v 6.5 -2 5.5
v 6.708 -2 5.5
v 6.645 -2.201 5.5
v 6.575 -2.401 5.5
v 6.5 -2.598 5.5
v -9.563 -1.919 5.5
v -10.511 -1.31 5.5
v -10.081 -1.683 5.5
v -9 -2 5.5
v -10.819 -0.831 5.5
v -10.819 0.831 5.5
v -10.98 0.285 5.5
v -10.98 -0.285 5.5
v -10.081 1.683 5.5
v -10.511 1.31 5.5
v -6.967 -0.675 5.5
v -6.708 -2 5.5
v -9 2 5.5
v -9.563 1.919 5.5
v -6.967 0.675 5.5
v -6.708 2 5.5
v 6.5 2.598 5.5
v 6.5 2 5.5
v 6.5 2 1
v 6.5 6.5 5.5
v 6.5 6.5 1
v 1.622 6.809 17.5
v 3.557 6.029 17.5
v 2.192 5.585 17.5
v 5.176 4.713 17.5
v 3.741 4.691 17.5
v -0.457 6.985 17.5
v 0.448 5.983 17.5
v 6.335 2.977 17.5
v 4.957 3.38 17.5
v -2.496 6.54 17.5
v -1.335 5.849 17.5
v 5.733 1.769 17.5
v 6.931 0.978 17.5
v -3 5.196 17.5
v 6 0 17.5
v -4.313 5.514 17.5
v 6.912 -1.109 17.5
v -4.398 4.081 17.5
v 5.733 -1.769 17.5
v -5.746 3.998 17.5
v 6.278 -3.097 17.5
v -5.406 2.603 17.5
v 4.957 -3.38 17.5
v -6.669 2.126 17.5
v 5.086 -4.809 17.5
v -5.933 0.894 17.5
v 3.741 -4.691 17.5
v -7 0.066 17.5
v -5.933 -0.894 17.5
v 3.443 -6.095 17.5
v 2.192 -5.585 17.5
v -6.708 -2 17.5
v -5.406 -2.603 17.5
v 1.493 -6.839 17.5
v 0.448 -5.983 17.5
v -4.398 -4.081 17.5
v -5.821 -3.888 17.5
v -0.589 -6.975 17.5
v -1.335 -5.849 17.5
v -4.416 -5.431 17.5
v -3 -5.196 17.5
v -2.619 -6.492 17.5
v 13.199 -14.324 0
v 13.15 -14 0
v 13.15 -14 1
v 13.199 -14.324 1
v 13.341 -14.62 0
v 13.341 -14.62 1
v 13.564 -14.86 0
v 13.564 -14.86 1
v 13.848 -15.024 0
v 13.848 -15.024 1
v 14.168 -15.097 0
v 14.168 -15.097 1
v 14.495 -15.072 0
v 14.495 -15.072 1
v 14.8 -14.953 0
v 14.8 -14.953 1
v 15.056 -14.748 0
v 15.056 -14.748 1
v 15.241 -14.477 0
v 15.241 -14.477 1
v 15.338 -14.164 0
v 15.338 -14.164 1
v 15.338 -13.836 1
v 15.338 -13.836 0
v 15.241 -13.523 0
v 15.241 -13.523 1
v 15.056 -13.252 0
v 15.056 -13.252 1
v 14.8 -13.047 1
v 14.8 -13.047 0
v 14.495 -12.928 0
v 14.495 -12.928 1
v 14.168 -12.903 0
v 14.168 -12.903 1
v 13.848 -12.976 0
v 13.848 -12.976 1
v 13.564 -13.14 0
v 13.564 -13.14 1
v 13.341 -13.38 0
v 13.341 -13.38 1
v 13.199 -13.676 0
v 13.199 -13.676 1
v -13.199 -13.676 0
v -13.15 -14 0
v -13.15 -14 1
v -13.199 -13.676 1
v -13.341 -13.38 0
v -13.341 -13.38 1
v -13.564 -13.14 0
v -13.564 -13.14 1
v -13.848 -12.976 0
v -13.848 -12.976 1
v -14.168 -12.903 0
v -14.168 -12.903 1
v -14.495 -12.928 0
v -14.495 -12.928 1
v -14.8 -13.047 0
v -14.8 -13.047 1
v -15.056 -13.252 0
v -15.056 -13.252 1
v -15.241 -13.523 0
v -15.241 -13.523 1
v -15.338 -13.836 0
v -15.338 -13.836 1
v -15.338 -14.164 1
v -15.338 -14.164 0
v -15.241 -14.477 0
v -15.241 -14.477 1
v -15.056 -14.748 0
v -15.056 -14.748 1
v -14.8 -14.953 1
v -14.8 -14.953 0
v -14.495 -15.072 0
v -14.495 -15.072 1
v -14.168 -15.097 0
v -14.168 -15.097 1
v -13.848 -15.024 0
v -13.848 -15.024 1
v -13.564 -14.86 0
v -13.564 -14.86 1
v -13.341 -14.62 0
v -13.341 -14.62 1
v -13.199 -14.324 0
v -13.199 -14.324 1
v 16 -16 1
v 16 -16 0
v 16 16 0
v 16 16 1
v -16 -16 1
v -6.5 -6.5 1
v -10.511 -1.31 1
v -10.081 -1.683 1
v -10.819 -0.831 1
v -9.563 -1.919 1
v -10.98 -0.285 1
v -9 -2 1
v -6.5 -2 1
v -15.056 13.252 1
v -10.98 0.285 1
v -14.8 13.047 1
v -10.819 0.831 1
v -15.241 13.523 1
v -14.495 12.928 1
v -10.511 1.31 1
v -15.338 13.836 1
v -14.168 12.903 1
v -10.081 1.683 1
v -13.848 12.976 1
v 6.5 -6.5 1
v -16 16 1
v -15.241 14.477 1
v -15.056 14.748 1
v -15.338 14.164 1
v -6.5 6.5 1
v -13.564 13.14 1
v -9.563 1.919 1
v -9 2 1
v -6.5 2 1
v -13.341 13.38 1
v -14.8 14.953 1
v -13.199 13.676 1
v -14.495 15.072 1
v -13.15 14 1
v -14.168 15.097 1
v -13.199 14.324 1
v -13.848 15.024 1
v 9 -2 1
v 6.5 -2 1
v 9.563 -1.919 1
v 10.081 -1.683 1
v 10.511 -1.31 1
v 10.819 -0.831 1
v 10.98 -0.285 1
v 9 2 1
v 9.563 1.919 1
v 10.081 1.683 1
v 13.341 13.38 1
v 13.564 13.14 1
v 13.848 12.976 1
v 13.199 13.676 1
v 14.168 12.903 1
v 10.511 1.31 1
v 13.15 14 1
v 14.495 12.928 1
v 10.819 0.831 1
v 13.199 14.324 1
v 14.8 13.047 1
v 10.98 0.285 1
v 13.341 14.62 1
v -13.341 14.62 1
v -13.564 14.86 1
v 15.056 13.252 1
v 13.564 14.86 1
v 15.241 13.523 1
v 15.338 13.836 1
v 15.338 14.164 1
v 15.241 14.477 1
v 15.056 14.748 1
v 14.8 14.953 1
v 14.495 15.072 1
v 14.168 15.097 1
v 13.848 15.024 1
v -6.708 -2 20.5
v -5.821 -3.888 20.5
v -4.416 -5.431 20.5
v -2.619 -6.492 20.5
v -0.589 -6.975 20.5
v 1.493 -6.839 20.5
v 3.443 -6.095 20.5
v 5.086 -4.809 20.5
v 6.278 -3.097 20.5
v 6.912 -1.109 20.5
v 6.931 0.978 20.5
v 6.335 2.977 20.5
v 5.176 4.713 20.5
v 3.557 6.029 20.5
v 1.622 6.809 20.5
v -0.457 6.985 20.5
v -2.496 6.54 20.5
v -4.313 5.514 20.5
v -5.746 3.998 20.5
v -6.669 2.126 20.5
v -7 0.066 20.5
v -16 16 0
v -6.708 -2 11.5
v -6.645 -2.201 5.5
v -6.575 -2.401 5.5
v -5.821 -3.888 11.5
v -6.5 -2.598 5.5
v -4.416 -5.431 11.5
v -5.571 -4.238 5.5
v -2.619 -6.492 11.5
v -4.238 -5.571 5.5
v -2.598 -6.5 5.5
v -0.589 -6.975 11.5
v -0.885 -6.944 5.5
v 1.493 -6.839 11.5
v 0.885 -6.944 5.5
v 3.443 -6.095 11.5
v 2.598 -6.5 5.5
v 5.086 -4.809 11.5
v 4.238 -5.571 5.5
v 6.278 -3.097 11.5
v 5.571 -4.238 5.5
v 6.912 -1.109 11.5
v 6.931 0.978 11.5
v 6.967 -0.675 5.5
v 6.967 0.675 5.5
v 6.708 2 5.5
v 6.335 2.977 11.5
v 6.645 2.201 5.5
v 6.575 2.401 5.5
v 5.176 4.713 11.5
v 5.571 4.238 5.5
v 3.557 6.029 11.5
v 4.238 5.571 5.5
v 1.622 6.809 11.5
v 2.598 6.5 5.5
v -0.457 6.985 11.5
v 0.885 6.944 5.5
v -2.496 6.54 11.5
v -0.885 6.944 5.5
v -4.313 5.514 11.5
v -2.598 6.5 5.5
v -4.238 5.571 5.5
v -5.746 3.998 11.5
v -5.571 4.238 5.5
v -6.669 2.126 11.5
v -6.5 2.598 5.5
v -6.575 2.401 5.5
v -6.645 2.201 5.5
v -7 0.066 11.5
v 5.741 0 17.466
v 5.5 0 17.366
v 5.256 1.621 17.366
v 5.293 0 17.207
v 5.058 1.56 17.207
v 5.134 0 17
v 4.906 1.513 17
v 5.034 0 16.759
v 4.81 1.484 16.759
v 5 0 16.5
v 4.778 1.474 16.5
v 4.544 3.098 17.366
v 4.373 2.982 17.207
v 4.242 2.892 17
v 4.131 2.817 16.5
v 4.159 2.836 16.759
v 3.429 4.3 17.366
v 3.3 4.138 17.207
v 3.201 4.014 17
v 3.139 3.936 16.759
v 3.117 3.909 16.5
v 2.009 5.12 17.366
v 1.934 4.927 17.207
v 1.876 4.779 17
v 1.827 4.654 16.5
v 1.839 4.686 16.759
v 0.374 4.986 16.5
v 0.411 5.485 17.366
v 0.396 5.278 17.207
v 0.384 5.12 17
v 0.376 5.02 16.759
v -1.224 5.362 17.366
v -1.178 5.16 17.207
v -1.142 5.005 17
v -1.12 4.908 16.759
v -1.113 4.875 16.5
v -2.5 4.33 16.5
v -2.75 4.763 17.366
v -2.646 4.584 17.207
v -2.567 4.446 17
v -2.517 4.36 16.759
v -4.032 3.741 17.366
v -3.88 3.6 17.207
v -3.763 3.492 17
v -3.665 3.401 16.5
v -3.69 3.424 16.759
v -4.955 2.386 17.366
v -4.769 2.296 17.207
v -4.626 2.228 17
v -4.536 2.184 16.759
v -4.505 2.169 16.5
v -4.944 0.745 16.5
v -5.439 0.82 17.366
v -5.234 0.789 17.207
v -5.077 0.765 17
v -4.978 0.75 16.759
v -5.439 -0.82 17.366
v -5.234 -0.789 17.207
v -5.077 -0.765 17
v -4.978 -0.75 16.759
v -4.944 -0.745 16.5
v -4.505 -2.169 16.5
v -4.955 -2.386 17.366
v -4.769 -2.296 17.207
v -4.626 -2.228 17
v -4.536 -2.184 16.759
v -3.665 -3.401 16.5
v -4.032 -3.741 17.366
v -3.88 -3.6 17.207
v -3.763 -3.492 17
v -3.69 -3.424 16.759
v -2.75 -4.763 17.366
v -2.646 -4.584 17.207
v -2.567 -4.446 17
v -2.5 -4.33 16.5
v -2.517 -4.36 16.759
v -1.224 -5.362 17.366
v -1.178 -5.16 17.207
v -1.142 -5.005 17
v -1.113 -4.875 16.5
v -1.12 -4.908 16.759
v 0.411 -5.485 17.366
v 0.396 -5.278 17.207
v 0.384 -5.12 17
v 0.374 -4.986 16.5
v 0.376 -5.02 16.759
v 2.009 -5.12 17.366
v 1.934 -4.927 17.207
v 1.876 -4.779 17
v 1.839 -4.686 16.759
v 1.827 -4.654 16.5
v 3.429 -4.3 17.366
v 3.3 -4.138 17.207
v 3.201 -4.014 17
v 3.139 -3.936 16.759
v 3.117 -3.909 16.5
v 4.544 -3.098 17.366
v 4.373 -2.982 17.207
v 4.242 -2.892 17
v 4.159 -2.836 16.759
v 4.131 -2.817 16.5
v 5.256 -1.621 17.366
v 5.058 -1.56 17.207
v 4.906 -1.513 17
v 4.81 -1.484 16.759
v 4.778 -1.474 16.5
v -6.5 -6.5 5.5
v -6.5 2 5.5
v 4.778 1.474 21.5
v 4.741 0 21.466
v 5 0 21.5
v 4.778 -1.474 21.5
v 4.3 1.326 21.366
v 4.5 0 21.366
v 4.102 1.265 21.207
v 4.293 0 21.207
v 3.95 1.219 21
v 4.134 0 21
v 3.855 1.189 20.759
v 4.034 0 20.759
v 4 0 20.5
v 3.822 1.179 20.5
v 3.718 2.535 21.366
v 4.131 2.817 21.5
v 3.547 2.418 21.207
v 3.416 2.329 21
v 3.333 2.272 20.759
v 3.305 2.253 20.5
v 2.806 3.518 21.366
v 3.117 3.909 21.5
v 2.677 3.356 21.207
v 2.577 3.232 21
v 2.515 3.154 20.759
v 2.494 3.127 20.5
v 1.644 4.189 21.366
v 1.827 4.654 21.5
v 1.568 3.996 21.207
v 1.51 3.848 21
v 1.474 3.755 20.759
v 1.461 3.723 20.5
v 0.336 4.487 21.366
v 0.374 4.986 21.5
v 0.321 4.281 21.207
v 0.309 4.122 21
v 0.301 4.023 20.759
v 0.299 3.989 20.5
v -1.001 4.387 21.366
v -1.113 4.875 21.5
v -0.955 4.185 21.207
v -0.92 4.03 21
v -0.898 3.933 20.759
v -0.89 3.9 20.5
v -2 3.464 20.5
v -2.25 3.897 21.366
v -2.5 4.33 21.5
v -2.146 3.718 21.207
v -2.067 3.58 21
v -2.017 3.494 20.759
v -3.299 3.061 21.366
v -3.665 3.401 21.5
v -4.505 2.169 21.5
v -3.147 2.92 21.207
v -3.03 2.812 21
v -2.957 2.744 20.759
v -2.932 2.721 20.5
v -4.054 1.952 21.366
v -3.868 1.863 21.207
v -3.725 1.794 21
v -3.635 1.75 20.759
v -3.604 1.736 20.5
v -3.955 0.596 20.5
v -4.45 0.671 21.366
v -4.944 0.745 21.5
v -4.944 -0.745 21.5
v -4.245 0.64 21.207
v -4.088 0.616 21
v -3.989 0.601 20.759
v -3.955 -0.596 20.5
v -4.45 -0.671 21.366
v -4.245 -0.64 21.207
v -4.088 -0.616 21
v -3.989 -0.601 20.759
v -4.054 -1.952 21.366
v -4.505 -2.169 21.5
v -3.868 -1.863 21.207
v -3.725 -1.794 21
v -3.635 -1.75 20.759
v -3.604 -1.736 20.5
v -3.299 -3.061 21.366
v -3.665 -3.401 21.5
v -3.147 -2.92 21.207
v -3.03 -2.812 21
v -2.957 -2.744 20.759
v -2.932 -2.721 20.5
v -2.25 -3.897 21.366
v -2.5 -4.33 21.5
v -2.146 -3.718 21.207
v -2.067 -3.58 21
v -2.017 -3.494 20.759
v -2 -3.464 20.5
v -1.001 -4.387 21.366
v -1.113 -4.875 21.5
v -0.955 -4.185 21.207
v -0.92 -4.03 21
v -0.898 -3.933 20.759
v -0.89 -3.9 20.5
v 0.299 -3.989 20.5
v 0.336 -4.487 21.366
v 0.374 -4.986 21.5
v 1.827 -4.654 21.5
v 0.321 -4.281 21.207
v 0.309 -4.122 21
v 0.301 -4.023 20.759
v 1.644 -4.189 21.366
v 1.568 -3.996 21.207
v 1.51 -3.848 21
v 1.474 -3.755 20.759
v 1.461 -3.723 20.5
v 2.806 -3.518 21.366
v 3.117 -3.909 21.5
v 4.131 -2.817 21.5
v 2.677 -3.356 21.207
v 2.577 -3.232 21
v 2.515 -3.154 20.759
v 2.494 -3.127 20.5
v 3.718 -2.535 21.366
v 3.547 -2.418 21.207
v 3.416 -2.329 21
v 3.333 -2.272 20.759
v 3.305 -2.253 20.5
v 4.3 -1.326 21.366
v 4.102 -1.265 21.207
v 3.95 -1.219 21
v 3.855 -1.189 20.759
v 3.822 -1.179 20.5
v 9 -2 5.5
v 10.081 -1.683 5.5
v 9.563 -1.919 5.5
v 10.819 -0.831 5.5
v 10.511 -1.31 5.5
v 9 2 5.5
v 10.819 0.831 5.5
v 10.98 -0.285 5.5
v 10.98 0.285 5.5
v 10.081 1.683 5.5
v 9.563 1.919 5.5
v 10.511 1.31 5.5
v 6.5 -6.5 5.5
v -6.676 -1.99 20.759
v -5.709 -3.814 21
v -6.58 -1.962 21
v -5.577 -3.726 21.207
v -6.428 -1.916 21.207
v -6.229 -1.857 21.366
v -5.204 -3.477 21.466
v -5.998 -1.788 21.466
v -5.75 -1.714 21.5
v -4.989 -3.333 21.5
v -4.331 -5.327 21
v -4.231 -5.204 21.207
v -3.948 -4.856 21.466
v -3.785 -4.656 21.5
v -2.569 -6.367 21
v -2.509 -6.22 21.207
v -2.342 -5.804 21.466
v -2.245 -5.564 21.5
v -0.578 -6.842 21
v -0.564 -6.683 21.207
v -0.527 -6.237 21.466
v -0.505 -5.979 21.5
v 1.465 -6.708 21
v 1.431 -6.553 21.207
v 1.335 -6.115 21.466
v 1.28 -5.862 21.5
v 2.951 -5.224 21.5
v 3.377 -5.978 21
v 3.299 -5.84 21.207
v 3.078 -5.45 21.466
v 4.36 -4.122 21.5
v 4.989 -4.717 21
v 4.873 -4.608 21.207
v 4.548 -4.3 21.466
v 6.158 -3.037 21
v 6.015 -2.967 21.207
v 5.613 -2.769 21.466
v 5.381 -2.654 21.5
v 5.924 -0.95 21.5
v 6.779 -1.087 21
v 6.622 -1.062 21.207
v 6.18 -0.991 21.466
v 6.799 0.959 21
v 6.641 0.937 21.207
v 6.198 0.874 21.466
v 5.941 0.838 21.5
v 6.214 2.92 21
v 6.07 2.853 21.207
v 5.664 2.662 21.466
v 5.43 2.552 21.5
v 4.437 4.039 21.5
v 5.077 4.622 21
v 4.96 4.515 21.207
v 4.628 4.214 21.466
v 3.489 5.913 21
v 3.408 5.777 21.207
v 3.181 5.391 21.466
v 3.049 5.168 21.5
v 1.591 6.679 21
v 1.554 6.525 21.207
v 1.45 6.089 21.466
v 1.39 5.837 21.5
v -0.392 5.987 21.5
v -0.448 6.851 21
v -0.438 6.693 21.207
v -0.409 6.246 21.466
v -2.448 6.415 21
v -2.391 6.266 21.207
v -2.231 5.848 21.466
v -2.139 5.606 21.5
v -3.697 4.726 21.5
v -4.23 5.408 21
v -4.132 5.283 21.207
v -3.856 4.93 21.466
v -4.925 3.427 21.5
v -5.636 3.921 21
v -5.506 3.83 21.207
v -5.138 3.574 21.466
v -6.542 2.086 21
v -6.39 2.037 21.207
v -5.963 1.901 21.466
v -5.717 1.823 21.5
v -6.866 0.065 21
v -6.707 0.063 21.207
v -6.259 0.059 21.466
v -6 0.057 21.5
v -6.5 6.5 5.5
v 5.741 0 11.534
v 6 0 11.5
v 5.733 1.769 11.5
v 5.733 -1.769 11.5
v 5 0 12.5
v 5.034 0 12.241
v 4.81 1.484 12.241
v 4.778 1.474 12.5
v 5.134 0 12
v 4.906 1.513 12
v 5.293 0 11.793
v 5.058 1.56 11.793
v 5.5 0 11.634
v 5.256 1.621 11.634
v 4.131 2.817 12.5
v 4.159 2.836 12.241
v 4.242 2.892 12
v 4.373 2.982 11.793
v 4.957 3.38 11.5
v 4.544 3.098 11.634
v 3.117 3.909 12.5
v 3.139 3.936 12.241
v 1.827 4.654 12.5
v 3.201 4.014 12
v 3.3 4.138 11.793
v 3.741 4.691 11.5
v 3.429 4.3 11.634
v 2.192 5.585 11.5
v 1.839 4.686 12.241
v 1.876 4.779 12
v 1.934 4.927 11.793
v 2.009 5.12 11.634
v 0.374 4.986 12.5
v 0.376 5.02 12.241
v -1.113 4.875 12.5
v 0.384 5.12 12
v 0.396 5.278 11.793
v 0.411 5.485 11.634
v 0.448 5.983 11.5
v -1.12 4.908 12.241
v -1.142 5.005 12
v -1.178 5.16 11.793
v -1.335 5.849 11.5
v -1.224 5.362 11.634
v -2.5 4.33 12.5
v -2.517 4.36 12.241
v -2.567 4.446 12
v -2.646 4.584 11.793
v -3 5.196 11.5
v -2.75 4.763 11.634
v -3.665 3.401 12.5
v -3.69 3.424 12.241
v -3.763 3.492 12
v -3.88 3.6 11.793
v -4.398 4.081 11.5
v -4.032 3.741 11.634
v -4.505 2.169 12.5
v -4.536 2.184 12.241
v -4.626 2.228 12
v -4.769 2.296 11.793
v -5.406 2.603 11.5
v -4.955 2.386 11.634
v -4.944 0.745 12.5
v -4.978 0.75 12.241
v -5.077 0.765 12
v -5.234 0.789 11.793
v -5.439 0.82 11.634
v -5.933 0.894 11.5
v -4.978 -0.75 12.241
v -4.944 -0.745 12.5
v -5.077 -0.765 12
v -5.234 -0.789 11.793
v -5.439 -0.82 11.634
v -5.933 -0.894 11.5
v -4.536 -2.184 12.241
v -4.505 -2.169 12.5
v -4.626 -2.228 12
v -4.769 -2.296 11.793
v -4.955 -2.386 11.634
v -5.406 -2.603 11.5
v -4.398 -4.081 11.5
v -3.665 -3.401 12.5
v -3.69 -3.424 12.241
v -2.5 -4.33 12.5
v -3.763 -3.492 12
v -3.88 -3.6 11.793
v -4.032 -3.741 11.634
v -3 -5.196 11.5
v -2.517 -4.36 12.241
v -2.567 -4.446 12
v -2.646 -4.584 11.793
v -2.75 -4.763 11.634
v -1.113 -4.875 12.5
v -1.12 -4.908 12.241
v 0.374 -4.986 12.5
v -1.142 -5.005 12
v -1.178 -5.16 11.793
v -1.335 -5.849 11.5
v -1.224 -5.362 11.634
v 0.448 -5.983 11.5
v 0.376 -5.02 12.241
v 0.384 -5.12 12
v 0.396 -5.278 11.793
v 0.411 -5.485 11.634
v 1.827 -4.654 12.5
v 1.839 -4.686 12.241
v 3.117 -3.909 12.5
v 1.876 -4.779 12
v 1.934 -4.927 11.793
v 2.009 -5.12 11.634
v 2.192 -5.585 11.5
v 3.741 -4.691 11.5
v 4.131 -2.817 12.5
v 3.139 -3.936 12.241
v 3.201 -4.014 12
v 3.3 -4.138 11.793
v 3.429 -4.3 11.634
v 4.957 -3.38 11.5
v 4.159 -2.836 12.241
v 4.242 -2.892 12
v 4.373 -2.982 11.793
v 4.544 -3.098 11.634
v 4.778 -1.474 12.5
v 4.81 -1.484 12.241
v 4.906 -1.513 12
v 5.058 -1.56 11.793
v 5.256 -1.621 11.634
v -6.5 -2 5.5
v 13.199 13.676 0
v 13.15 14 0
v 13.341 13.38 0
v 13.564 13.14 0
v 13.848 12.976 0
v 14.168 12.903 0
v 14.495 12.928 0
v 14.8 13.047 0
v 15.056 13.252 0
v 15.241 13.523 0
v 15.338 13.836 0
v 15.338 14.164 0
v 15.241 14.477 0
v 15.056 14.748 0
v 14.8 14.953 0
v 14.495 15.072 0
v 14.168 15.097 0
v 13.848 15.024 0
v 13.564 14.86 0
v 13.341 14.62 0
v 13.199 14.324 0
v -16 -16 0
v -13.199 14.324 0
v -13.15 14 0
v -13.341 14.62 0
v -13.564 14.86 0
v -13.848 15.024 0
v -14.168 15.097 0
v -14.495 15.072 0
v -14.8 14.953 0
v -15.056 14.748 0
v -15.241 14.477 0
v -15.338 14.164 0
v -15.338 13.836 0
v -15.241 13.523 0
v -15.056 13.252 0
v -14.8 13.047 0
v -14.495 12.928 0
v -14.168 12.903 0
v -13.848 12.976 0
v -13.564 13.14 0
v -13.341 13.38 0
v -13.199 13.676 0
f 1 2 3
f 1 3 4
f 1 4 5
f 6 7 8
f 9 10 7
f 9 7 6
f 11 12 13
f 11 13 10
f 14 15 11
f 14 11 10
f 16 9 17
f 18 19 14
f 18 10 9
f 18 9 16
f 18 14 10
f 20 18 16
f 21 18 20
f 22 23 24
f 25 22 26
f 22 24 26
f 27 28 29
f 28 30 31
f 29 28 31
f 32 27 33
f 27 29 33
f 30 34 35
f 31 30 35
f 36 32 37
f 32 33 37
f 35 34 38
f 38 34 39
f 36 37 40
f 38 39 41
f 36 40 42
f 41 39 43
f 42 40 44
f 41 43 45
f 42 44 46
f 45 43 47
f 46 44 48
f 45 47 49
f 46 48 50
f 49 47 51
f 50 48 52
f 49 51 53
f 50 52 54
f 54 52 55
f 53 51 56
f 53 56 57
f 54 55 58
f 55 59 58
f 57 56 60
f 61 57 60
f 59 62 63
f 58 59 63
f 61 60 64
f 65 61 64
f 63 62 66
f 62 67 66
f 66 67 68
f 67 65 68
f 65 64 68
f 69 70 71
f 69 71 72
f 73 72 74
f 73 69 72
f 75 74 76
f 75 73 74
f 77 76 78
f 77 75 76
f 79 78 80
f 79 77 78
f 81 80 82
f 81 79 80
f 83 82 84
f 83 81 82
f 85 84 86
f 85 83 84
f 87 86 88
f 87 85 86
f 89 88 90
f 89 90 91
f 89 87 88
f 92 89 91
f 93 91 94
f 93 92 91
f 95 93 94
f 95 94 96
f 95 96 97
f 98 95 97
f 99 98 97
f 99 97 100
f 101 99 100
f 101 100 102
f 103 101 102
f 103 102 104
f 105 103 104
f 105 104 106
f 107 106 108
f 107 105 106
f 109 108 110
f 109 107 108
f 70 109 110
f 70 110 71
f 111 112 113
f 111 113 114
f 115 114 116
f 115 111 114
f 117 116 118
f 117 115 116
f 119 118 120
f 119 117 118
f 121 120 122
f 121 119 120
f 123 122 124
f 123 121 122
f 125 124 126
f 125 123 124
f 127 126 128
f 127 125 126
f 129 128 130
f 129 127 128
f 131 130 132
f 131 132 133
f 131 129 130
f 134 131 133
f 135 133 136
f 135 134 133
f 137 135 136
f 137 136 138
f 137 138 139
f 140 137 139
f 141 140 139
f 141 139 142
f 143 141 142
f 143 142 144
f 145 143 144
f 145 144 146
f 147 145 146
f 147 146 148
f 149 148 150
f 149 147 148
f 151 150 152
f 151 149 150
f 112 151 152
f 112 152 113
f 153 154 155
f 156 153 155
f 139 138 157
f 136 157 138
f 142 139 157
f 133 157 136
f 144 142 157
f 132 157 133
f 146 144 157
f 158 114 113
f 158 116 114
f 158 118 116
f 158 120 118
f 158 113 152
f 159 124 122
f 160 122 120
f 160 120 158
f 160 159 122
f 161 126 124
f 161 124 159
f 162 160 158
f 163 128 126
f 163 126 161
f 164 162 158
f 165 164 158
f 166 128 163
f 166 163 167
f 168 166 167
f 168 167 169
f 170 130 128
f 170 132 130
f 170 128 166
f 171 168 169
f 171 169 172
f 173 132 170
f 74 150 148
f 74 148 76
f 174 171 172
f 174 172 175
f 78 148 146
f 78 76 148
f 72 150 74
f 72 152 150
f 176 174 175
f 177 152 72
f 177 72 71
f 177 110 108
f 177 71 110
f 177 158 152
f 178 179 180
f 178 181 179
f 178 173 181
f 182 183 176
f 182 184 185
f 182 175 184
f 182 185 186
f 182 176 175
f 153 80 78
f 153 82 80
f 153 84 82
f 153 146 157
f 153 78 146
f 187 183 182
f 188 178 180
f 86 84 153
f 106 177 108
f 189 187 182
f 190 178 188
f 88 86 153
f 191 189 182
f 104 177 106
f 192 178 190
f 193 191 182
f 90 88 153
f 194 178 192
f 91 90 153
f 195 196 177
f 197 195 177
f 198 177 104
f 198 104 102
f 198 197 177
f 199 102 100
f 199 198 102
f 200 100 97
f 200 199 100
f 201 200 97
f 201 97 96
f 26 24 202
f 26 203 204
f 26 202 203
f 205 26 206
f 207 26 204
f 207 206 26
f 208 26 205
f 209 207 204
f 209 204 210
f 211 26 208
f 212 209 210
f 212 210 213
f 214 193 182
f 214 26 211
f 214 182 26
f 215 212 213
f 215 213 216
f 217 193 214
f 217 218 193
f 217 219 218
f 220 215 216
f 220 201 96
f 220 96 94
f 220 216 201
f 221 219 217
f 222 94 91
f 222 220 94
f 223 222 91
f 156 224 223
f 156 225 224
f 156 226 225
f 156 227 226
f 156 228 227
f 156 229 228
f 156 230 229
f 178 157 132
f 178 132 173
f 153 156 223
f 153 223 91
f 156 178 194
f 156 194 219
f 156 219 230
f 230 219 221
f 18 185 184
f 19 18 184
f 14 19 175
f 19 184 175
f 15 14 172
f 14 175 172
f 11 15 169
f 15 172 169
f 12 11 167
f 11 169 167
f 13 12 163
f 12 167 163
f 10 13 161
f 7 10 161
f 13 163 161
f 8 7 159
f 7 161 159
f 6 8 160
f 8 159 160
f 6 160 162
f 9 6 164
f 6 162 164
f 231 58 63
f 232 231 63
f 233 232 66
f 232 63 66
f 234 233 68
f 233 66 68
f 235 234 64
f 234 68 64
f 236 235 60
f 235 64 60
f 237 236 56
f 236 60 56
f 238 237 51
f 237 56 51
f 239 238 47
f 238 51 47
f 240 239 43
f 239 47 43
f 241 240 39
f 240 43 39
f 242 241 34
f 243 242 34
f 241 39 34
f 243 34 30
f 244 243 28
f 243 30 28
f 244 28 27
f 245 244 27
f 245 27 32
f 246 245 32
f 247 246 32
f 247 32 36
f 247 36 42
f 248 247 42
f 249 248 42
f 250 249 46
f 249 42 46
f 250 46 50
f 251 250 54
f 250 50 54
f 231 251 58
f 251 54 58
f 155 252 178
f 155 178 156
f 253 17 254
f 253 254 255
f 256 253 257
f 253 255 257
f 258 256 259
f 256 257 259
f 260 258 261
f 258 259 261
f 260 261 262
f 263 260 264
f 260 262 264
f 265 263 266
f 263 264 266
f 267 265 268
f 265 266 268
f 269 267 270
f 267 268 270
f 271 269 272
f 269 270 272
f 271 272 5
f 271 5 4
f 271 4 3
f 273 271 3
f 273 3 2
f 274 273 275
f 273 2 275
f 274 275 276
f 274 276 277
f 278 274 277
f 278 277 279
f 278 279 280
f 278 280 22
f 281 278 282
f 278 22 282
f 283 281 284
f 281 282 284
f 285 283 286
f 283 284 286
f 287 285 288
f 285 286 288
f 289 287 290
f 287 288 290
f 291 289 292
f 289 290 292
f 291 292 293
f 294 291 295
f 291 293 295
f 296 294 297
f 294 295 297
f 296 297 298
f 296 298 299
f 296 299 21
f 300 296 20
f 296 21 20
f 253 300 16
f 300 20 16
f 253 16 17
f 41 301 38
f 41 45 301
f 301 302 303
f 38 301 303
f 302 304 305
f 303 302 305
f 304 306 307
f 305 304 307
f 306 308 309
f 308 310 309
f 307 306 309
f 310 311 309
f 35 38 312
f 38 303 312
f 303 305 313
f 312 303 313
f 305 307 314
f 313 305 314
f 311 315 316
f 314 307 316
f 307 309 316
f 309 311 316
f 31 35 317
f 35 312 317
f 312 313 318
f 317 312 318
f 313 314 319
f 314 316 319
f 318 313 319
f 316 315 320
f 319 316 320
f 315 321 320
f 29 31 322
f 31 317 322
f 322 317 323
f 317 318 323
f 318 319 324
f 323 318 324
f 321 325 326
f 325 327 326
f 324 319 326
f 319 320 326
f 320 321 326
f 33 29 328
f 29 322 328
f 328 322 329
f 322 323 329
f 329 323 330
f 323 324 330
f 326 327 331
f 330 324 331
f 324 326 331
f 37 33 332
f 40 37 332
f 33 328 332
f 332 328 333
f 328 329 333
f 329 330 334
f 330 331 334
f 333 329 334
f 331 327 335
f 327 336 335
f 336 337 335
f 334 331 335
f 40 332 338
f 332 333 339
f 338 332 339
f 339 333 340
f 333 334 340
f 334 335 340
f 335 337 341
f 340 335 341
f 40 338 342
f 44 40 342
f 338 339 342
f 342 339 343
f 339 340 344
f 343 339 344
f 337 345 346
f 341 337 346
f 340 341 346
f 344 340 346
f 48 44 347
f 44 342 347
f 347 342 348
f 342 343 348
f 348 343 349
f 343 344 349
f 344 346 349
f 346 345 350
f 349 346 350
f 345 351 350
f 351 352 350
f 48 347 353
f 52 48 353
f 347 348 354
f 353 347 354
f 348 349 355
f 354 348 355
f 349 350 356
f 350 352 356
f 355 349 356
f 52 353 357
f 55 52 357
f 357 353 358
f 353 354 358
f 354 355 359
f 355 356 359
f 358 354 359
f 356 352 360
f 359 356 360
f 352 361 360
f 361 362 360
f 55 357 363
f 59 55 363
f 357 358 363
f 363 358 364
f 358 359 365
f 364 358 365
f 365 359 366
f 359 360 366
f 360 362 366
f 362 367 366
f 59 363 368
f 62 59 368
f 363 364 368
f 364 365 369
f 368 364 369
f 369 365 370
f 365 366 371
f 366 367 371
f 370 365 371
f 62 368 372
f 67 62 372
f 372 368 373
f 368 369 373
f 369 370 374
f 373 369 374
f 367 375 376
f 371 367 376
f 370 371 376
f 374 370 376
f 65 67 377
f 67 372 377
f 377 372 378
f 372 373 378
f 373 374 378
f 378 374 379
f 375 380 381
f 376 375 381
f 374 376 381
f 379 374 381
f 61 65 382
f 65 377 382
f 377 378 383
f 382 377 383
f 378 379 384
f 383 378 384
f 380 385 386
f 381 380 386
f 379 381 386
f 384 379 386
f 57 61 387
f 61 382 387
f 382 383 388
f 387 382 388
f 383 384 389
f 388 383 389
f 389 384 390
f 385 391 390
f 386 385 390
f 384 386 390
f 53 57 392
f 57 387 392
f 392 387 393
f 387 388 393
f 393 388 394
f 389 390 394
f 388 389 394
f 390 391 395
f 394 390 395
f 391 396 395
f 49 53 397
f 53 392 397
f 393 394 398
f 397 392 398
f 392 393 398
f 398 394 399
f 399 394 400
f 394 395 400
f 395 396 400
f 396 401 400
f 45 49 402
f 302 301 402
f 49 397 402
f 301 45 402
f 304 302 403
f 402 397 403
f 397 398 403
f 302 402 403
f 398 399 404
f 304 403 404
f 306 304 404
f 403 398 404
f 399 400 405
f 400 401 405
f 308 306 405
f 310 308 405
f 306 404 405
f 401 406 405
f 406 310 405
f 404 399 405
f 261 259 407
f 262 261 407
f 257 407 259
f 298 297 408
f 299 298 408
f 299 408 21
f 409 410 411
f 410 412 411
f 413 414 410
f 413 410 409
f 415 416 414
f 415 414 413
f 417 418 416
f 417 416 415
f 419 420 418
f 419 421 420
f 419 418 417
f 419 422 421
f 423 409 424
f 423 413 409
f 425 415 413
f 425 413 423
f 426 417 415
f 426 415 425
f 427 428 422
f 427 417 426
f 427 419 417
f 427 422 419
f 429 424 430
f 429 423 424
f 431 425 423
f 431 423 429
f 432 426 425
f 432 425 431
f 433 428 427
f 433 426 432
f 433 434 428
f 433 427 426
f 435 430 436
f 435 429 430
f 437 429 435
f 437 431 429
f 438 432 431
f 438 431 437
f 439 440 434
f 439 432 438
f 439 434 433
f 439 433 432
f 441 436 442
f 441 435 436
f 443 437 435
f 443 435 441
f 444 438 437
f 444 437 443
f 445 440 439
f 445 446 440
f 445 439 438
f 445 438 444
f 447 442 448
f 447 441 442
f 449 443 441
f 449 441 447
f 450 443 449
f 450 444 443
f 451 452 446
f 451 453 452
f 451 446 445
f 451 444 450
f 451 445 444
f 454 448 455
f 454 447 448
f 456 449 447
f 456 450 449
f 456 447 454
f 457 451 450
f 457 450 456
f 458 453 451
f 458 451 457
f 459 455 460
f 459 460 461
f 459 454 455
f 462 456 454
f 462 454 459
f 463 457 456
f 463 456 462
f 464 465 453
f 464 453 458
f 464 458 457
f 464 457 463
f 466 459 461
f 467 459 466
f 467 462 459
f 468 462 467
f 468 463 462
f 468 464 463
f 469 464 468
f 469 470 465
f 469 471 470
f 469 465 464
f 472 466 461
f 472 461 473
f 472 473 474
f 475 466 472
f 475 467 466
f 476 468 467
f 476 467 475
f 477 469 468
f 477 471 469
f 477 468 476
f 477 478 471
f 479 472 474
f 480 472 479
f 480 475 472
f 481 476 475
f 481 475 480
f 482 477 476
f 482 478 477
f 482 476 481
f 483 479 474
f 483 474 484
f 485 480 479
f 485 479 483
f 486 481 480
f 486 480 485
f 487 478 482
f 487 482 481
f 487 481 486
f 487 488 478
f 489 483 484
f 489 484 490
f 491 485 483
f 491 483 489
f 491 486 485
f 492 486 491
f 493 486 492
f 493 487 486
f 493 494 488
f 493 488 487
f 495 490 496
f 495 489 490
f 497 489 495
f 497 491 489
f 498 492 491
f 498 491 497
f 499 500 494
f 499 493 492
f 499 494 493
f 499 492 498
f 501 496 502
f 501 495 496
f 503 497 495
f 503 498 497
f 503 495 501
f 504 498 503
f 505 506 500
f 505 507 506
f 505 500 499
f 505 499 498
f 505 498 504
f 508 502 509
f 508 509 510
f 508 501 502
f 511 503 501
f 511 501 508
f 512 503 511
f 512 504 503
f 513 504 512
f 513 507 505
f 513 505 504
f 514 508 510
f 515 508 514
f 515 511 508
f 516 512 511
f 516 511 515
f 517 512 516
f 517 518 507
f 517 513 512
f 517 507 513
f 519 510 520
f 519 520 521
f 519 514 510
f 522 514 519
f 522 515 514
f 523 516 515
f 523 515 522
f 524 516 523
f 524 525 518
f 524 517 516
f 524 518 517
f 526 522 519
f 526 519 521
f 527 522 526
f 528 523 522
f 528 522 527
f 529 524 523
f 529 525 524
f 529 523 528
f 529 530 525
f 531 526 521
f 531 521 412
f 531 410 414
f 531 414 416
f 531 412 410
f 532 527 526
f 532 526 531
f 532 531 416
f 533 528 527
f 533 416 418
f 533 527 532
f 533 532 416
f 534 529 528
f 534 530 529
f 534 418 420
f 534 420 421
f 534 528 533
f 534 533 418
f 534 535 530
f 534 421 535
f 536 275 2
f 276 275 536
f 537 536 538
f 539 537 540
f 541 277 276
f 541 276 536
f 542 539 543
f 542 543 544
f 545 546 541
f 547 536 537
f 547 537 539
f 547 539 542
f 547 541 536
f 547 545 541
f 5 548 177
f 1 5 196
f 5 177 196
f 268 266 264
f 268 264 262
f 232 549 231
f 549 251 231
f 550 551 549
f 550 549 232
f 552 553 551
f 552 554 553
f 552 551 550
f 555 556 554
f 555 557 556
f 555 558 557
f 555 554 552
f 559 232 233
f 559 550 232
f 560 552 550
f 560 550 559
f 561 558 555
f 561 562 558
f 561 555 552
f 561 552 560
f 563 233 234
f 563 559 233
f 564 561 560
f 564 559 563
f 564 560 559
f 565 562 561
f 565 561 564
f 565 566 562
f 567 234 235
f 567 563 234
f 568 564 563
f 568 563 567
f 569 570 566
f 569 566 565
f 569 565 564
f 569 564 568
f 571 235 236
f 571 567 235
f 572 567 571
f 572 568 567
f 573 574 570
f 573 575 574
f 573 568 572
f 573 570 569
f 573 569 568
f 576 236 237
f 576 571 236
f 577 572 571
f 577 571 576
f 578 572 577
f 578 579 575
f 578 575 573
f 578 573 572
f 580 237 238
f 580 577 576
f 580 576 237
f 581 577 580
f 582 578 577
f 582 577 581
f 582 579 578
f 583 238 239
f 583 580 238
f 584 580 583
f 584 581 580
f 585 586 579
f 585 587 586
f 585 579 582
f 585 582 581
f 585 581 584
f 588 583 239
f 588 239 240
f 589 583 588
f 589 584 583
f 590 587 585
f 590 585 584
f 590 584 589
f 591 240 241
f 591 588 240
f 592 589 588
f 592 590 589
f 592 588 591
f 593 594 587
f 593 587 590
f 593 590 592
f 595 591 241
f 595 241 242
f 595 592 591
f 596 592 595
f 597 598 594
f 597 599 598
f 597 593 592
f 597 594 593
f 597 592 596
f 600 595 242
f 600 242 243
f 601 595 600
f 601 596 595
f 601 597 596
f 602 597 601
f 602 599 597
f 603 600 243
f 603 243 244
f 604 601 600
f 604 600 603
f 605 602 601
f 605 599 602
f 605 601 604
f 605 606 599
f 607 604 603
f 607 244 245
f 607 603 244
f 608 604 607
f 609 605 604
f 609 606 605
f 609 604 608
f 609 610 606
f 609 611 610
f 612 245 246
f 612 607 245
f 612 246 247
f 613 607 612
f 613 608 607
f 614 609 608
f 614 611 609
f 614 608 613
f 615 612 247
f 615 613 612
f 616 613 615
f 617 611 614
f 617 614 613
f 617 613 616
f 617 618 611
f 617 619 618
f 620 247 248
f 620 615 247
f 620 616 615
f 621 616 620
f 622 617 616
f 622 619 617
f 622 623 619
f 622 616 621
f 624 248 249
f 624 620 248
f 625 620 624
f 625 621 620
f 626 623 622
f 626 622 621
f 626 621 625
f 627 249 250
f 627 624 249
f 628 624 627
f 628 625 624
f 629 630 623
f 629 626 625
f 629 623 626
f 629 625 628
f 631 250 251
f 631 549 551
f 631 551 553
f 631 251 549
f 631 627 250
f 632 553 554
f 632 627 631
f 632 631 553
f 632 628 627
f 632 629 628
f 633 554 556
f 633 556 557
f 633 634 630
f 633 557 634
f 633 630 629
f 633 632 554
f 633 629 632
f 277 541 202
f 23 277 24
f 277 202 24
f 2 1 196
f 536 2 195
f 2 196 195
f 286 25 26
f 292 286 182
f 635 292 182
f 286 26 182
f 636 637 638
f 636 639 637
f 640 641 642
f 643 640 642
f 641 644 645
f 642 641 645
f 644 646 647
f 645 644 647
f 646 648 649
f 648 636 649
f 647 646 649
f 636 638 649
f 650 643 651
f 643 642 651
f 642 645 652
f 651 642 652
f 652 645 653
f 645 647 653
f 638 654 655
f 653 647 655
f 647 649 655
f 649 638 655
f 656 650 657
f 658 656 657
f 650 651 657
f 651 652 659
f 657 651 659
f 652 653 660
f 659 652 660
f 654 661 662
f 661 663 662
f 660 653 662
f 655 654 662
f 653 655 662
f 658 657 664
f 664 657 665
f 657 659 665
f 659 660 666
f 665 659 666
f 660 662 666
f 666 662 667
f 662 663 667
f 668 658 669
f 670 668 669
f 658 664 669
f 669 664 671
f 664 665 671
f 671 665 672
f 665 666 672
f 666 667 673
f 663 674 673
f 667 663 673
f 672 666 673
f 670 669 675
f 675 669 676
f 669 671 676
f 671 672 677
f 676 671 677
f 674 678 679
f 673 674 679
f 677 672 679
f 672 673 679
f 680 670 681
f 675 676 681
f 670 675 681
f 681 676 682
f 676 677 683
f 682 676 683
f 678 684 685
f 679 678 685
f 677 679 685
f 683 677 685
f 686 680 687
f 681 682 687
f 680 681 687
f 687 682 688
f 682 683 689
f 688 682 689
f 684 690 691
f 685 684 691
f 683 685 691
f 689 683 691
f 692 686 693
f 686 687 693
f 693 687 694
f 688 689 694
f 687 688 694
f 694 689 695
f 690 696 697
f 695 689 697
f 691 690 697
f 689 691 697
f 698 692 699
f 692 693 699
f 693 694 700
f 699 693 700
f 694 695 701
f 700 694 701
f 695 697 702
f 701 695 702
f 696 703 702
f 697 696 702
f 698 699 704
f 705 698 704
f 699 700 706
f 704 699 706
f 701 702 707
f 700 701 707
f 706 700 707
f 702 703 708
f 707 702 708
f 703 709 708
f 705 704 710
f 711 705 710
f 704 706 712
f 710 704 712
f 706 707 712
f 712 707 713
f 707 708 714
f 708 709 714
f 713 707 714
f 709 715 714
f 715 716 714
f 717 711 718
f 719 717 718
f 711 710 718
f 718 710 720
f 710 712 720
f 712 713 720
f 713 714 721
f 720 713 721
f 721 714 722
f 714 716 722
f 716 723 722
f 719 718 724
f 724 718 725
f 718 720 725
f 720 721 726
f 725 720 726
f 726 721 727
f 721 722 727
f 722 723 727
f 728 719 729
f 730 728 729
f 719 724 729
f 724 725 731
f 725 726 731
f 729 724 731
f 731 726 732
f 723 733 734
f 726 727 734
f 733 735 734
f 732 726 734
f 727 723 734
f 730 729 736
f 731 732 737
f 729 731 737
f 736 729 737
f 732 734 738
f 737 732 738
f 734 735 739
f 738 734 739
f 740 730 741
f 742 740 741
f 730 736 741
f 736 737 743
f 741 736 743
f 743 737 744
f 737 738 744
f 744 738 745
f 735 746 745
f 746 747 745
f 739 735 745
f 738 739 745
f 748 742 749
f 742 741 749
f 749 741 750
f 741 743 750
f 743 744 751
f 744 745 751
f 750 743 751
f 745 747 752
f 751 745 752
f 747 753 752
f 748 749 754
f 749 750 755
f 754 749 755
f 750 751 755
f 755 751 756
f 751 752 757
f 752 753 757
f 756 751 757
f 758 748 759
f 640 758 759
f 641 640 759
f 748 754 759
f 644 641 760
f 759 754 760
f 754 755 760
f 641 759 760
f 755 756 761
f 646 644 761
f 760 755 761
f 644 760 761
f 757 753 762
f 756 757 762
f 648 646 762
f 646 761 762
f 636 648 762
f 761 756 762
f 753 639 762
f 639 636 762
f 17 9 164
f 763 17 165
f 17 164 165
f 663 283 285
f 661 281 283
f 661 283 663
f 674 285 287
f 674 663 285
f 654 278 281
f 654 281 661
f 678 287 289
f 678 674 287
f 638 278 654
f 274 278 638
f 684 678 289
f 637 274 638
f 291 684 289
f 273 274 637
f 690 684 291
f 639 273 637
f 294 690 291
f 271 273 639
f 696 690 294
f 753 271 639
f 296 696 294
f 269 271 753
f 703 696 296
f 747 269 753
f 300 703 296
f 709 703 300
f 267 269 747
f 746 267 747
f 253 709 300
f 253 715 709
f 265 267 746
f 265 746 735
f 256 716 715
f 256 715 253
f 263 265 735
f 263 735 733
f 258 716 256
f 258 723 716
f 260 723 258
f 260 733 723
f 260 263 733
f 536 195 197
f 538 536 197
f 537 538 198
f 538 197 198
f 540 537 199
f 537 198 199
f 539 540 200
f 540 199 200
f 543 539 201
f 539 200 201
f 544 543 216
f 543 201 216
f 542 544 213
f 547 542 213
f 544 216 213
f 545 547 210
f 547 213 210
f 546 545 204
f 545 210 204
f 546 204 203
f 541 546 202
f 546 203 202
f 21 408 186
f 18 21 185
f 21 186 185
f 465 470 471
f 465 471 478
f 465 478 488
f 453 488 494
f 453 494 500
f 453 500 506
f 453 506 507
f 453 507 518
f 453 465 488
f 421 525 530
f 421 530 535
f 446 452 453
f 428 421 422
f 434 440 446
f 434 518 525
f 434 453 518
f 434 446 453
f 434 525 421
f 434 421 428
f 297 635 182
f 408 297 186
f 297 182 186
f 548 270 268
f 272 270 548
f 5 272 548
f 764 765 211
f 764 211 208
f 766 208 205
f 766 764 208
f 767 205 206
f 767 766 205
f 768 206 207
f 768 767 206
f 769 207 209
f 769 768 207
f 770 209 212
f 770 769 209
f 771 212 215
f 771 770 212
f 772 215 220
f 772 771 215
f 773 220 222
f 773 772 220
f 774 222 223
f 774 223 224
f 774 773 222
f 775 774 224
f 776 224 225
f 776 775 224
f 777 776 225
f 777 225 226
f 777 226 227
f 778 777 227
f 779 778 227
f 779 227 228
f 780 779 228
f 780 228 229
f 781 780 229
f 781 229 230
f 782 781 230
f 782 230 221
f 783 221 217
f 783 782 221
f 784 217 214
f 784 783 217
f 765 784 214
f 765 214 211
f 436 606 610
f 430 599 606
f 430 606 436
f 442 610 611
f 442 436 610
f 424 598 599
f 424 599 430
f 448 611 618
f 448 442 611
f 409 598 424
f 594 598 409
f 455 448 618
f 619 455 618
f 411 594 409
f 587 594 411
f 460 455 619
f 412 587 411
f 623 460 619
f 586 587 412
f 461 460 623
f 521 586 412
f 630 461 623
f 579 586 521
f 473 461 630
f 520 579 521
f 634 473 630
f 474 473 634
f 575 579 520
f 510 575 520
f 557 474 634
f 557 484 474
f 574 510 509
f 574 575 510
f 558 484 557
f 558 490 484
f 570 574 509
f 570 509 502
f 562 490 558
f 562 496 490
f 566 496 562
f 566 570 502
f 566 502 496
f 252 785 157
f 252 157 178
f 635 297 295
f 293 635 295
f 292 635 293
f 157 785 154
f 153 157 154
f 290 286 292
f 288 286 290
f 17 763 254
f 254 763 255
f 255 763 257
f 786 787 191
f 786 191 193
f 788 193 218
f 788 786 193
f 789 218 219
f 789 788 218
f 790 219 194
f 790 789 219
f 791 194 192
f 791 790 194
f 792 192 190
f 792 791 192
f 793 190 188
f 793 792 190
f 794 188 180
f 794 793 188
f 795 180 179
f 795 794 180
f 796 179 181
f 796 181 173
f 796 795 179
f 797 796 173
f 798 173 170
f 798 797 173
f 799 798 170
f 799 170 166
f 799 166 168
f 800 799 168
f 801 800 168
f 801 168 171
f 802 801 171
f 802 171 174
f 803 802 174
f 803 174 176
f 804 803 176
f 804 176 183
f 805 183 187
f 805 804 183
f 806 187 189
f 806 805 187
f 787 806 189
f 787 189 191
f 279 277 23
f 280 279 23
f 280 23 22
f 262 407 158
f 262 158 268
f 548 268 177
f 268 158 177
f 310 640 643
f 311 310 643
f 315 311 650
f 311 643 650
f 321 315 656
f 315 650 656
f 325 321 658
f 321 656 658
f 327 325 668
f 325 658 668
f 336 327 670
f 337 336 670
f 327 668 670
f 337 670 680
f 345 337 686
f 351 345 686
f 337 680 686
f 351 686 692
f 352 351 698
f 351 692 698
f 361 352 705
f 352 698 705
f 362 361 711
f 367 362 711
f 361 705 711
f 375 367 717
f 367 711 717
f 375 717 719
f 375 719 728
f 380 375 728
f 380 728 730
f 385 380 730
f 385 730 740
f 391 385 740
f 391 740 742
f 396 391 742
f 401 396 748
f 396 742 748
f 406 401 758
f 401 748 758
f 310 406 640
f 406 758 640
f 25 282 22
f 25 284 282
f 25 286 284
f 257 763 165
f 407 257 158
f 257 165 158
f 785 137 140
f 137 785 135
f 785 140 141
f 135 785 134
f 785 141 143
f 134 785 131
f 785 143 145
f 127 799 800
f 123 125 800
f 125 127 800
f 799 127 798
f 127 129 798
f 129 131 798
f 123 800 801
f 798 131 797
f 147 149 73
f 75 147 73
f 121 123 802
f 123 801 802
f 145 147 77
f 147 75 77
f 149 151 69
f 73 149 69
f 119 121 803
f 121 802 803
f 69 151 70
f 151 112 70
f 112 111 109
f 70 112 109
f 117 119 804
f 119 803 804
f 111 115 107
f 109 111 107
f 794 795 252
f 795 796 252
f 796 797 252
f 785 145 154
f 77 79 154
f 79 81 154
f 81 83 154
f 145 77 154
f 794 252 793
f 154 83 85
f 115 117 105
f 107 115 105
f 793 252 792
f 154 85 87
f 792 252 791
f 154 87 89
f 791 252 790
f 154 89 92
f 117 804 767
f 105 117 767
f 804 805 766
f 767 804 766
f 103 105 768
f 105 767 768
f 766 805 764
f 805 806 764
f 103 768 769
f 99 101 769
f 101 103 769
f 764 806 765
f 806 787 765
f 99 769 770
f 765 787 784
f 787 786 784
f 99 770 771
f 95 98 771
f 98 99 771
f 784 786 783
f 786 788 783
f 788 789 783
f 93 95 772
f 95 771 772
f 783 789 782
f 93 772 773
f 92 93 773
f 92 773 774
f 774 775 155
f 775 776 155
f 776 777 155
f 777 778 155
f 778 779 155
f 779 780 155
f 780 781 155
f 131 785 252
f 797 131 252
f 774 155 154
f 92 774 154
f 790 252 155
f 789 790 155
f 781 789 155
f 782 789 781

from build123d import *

# Parameters (mm, degrees)
SKETCH_2_W          = 32
SKETCH_2_H          = 32
SKETCH_2_R          = 1.1
EXTRUDE_1_DEPTH     = 1
EXTRUDE_2_DEPTH     = 4.5
SKETCH_4_R          = 7
EXTRUDE_3_DEPTH     = 6
SKETCH_5_R          = 5
EXTRUDE_4_DEPTH     = 6
SKETCH_6_R          = 7
EXTRUDE_5_DEPTH     = 4
SKETCH_9_R          = 4
CUT_EXTRUDE_2_DEPTH = 1
FILLET_2_R          = 1


with BuildPart() as part:
    # 草图2 → 凸台-拉伸1 (new body)
    with BuildSketch(Plane.XY):
        Rectangle(SKETCH_2_W, SKETCH_2_H)
        with Locations((-14.25, -14)):
            Circle(SKETCH_2_R, mode=Mode.SUBTRACT)
        with Locations((-14.25, 14)):
            Circle(SKETCH_2_R, mode=Mode.SUBTRACT)
        with Locations(Location((14.25, 14, 0), (0, 0, 180))):
            Circle(SKETCH_2_R, mode=Mode.SUBTRACT)
        with Locations(Location((14.25, -14, 0), (0, 0, 180))):
            Circle(SKETCH_2_R, mode=Mode.SUBTRACT)
    extrude(amount=EXTRUDE_1_DEPTH)

    # 草图3 → 凸台-拉伸2 (add)
    with BuildSketch(Plane.XY.offset(1)):
        with BuildLine():
            Line((-6.5, -6.5), (6.5, -6.5))
            Line((6.5, -6.5), (6.5, -2))
            Line((6.5, -2), (9, -2))
            ThreePointArc((9, -2), (11, 0), (9, 2))
            Line((9, 2), (6.5, 2))
            Line((6.5, 2), (6.5, 6.5))
            Line((6.5, 6.5), (-6.5, 6.5))
            Line((-6.5, 6.5), (-6.5, 2))
            Line((-6.5, 2), (-9, 2))
            ThreePointArc((-9, 2), (-11, 0), (-9, -2))
            Line((-9, -2), (-6.5, -2))
            Line((-6.5, -2), (-6.5, -6.5))
        make_face()
    extrude(amount=EXTRUDE_2_DEPTH)

    # 草图4 → 凸台-拉伸3 (add)
    with BuildSketch(Plane.XY.offset(5.5)):
        with Locations(Location((0, 0, 0), (0, 0, 196.601549599))):
            Circle(SKETCH_4_R)
    extrude(amount=EXTRUDE_3_DEPTH)

    # 草图5 → 凸台-拉伸4 (add)
    with BuildSketch(Plane.XY.offset(11.5)):
        Circle(SKETCH_5_R)
    extrude(amount=EXTRUDE_4_DEPTH)

    # 草图6 → 凸台-拉伸5 (add)
    with BuildSketch(Plane.XY.offset(17.5)):
        with Locations(Location((0, 0, 0), (0, 0, 196.601549599))):
            Circle(SKETCH_6_R)
    extrude(amount=EXTRUDE_5_DEPTH)

    # 草图9 → 切除-拉伸2 (cut)
    with BuildSketch(Plane.XY.offset(21.5)):
        Circle(SKETCH_9_R)
    extrude(amount=-CUT_EXTRUDE_2_DEPTH, mode=Mode.SUBTRACT)

    # 圆角2
    fillet_2_edges = [part.edges().sort_by_distance(p)[0] for p in [
        (-4, 0, 21.5),
        (-5, 0, 11.5),
        (-5, 0, 17.5),
        (6.708203933, 2, 21.5),
    ]]
    fillet(fillet_2_edges, radius=FILLET_2_R - 0.0001)  # a hair under: the kernel refuses the full size


solid = part.part
